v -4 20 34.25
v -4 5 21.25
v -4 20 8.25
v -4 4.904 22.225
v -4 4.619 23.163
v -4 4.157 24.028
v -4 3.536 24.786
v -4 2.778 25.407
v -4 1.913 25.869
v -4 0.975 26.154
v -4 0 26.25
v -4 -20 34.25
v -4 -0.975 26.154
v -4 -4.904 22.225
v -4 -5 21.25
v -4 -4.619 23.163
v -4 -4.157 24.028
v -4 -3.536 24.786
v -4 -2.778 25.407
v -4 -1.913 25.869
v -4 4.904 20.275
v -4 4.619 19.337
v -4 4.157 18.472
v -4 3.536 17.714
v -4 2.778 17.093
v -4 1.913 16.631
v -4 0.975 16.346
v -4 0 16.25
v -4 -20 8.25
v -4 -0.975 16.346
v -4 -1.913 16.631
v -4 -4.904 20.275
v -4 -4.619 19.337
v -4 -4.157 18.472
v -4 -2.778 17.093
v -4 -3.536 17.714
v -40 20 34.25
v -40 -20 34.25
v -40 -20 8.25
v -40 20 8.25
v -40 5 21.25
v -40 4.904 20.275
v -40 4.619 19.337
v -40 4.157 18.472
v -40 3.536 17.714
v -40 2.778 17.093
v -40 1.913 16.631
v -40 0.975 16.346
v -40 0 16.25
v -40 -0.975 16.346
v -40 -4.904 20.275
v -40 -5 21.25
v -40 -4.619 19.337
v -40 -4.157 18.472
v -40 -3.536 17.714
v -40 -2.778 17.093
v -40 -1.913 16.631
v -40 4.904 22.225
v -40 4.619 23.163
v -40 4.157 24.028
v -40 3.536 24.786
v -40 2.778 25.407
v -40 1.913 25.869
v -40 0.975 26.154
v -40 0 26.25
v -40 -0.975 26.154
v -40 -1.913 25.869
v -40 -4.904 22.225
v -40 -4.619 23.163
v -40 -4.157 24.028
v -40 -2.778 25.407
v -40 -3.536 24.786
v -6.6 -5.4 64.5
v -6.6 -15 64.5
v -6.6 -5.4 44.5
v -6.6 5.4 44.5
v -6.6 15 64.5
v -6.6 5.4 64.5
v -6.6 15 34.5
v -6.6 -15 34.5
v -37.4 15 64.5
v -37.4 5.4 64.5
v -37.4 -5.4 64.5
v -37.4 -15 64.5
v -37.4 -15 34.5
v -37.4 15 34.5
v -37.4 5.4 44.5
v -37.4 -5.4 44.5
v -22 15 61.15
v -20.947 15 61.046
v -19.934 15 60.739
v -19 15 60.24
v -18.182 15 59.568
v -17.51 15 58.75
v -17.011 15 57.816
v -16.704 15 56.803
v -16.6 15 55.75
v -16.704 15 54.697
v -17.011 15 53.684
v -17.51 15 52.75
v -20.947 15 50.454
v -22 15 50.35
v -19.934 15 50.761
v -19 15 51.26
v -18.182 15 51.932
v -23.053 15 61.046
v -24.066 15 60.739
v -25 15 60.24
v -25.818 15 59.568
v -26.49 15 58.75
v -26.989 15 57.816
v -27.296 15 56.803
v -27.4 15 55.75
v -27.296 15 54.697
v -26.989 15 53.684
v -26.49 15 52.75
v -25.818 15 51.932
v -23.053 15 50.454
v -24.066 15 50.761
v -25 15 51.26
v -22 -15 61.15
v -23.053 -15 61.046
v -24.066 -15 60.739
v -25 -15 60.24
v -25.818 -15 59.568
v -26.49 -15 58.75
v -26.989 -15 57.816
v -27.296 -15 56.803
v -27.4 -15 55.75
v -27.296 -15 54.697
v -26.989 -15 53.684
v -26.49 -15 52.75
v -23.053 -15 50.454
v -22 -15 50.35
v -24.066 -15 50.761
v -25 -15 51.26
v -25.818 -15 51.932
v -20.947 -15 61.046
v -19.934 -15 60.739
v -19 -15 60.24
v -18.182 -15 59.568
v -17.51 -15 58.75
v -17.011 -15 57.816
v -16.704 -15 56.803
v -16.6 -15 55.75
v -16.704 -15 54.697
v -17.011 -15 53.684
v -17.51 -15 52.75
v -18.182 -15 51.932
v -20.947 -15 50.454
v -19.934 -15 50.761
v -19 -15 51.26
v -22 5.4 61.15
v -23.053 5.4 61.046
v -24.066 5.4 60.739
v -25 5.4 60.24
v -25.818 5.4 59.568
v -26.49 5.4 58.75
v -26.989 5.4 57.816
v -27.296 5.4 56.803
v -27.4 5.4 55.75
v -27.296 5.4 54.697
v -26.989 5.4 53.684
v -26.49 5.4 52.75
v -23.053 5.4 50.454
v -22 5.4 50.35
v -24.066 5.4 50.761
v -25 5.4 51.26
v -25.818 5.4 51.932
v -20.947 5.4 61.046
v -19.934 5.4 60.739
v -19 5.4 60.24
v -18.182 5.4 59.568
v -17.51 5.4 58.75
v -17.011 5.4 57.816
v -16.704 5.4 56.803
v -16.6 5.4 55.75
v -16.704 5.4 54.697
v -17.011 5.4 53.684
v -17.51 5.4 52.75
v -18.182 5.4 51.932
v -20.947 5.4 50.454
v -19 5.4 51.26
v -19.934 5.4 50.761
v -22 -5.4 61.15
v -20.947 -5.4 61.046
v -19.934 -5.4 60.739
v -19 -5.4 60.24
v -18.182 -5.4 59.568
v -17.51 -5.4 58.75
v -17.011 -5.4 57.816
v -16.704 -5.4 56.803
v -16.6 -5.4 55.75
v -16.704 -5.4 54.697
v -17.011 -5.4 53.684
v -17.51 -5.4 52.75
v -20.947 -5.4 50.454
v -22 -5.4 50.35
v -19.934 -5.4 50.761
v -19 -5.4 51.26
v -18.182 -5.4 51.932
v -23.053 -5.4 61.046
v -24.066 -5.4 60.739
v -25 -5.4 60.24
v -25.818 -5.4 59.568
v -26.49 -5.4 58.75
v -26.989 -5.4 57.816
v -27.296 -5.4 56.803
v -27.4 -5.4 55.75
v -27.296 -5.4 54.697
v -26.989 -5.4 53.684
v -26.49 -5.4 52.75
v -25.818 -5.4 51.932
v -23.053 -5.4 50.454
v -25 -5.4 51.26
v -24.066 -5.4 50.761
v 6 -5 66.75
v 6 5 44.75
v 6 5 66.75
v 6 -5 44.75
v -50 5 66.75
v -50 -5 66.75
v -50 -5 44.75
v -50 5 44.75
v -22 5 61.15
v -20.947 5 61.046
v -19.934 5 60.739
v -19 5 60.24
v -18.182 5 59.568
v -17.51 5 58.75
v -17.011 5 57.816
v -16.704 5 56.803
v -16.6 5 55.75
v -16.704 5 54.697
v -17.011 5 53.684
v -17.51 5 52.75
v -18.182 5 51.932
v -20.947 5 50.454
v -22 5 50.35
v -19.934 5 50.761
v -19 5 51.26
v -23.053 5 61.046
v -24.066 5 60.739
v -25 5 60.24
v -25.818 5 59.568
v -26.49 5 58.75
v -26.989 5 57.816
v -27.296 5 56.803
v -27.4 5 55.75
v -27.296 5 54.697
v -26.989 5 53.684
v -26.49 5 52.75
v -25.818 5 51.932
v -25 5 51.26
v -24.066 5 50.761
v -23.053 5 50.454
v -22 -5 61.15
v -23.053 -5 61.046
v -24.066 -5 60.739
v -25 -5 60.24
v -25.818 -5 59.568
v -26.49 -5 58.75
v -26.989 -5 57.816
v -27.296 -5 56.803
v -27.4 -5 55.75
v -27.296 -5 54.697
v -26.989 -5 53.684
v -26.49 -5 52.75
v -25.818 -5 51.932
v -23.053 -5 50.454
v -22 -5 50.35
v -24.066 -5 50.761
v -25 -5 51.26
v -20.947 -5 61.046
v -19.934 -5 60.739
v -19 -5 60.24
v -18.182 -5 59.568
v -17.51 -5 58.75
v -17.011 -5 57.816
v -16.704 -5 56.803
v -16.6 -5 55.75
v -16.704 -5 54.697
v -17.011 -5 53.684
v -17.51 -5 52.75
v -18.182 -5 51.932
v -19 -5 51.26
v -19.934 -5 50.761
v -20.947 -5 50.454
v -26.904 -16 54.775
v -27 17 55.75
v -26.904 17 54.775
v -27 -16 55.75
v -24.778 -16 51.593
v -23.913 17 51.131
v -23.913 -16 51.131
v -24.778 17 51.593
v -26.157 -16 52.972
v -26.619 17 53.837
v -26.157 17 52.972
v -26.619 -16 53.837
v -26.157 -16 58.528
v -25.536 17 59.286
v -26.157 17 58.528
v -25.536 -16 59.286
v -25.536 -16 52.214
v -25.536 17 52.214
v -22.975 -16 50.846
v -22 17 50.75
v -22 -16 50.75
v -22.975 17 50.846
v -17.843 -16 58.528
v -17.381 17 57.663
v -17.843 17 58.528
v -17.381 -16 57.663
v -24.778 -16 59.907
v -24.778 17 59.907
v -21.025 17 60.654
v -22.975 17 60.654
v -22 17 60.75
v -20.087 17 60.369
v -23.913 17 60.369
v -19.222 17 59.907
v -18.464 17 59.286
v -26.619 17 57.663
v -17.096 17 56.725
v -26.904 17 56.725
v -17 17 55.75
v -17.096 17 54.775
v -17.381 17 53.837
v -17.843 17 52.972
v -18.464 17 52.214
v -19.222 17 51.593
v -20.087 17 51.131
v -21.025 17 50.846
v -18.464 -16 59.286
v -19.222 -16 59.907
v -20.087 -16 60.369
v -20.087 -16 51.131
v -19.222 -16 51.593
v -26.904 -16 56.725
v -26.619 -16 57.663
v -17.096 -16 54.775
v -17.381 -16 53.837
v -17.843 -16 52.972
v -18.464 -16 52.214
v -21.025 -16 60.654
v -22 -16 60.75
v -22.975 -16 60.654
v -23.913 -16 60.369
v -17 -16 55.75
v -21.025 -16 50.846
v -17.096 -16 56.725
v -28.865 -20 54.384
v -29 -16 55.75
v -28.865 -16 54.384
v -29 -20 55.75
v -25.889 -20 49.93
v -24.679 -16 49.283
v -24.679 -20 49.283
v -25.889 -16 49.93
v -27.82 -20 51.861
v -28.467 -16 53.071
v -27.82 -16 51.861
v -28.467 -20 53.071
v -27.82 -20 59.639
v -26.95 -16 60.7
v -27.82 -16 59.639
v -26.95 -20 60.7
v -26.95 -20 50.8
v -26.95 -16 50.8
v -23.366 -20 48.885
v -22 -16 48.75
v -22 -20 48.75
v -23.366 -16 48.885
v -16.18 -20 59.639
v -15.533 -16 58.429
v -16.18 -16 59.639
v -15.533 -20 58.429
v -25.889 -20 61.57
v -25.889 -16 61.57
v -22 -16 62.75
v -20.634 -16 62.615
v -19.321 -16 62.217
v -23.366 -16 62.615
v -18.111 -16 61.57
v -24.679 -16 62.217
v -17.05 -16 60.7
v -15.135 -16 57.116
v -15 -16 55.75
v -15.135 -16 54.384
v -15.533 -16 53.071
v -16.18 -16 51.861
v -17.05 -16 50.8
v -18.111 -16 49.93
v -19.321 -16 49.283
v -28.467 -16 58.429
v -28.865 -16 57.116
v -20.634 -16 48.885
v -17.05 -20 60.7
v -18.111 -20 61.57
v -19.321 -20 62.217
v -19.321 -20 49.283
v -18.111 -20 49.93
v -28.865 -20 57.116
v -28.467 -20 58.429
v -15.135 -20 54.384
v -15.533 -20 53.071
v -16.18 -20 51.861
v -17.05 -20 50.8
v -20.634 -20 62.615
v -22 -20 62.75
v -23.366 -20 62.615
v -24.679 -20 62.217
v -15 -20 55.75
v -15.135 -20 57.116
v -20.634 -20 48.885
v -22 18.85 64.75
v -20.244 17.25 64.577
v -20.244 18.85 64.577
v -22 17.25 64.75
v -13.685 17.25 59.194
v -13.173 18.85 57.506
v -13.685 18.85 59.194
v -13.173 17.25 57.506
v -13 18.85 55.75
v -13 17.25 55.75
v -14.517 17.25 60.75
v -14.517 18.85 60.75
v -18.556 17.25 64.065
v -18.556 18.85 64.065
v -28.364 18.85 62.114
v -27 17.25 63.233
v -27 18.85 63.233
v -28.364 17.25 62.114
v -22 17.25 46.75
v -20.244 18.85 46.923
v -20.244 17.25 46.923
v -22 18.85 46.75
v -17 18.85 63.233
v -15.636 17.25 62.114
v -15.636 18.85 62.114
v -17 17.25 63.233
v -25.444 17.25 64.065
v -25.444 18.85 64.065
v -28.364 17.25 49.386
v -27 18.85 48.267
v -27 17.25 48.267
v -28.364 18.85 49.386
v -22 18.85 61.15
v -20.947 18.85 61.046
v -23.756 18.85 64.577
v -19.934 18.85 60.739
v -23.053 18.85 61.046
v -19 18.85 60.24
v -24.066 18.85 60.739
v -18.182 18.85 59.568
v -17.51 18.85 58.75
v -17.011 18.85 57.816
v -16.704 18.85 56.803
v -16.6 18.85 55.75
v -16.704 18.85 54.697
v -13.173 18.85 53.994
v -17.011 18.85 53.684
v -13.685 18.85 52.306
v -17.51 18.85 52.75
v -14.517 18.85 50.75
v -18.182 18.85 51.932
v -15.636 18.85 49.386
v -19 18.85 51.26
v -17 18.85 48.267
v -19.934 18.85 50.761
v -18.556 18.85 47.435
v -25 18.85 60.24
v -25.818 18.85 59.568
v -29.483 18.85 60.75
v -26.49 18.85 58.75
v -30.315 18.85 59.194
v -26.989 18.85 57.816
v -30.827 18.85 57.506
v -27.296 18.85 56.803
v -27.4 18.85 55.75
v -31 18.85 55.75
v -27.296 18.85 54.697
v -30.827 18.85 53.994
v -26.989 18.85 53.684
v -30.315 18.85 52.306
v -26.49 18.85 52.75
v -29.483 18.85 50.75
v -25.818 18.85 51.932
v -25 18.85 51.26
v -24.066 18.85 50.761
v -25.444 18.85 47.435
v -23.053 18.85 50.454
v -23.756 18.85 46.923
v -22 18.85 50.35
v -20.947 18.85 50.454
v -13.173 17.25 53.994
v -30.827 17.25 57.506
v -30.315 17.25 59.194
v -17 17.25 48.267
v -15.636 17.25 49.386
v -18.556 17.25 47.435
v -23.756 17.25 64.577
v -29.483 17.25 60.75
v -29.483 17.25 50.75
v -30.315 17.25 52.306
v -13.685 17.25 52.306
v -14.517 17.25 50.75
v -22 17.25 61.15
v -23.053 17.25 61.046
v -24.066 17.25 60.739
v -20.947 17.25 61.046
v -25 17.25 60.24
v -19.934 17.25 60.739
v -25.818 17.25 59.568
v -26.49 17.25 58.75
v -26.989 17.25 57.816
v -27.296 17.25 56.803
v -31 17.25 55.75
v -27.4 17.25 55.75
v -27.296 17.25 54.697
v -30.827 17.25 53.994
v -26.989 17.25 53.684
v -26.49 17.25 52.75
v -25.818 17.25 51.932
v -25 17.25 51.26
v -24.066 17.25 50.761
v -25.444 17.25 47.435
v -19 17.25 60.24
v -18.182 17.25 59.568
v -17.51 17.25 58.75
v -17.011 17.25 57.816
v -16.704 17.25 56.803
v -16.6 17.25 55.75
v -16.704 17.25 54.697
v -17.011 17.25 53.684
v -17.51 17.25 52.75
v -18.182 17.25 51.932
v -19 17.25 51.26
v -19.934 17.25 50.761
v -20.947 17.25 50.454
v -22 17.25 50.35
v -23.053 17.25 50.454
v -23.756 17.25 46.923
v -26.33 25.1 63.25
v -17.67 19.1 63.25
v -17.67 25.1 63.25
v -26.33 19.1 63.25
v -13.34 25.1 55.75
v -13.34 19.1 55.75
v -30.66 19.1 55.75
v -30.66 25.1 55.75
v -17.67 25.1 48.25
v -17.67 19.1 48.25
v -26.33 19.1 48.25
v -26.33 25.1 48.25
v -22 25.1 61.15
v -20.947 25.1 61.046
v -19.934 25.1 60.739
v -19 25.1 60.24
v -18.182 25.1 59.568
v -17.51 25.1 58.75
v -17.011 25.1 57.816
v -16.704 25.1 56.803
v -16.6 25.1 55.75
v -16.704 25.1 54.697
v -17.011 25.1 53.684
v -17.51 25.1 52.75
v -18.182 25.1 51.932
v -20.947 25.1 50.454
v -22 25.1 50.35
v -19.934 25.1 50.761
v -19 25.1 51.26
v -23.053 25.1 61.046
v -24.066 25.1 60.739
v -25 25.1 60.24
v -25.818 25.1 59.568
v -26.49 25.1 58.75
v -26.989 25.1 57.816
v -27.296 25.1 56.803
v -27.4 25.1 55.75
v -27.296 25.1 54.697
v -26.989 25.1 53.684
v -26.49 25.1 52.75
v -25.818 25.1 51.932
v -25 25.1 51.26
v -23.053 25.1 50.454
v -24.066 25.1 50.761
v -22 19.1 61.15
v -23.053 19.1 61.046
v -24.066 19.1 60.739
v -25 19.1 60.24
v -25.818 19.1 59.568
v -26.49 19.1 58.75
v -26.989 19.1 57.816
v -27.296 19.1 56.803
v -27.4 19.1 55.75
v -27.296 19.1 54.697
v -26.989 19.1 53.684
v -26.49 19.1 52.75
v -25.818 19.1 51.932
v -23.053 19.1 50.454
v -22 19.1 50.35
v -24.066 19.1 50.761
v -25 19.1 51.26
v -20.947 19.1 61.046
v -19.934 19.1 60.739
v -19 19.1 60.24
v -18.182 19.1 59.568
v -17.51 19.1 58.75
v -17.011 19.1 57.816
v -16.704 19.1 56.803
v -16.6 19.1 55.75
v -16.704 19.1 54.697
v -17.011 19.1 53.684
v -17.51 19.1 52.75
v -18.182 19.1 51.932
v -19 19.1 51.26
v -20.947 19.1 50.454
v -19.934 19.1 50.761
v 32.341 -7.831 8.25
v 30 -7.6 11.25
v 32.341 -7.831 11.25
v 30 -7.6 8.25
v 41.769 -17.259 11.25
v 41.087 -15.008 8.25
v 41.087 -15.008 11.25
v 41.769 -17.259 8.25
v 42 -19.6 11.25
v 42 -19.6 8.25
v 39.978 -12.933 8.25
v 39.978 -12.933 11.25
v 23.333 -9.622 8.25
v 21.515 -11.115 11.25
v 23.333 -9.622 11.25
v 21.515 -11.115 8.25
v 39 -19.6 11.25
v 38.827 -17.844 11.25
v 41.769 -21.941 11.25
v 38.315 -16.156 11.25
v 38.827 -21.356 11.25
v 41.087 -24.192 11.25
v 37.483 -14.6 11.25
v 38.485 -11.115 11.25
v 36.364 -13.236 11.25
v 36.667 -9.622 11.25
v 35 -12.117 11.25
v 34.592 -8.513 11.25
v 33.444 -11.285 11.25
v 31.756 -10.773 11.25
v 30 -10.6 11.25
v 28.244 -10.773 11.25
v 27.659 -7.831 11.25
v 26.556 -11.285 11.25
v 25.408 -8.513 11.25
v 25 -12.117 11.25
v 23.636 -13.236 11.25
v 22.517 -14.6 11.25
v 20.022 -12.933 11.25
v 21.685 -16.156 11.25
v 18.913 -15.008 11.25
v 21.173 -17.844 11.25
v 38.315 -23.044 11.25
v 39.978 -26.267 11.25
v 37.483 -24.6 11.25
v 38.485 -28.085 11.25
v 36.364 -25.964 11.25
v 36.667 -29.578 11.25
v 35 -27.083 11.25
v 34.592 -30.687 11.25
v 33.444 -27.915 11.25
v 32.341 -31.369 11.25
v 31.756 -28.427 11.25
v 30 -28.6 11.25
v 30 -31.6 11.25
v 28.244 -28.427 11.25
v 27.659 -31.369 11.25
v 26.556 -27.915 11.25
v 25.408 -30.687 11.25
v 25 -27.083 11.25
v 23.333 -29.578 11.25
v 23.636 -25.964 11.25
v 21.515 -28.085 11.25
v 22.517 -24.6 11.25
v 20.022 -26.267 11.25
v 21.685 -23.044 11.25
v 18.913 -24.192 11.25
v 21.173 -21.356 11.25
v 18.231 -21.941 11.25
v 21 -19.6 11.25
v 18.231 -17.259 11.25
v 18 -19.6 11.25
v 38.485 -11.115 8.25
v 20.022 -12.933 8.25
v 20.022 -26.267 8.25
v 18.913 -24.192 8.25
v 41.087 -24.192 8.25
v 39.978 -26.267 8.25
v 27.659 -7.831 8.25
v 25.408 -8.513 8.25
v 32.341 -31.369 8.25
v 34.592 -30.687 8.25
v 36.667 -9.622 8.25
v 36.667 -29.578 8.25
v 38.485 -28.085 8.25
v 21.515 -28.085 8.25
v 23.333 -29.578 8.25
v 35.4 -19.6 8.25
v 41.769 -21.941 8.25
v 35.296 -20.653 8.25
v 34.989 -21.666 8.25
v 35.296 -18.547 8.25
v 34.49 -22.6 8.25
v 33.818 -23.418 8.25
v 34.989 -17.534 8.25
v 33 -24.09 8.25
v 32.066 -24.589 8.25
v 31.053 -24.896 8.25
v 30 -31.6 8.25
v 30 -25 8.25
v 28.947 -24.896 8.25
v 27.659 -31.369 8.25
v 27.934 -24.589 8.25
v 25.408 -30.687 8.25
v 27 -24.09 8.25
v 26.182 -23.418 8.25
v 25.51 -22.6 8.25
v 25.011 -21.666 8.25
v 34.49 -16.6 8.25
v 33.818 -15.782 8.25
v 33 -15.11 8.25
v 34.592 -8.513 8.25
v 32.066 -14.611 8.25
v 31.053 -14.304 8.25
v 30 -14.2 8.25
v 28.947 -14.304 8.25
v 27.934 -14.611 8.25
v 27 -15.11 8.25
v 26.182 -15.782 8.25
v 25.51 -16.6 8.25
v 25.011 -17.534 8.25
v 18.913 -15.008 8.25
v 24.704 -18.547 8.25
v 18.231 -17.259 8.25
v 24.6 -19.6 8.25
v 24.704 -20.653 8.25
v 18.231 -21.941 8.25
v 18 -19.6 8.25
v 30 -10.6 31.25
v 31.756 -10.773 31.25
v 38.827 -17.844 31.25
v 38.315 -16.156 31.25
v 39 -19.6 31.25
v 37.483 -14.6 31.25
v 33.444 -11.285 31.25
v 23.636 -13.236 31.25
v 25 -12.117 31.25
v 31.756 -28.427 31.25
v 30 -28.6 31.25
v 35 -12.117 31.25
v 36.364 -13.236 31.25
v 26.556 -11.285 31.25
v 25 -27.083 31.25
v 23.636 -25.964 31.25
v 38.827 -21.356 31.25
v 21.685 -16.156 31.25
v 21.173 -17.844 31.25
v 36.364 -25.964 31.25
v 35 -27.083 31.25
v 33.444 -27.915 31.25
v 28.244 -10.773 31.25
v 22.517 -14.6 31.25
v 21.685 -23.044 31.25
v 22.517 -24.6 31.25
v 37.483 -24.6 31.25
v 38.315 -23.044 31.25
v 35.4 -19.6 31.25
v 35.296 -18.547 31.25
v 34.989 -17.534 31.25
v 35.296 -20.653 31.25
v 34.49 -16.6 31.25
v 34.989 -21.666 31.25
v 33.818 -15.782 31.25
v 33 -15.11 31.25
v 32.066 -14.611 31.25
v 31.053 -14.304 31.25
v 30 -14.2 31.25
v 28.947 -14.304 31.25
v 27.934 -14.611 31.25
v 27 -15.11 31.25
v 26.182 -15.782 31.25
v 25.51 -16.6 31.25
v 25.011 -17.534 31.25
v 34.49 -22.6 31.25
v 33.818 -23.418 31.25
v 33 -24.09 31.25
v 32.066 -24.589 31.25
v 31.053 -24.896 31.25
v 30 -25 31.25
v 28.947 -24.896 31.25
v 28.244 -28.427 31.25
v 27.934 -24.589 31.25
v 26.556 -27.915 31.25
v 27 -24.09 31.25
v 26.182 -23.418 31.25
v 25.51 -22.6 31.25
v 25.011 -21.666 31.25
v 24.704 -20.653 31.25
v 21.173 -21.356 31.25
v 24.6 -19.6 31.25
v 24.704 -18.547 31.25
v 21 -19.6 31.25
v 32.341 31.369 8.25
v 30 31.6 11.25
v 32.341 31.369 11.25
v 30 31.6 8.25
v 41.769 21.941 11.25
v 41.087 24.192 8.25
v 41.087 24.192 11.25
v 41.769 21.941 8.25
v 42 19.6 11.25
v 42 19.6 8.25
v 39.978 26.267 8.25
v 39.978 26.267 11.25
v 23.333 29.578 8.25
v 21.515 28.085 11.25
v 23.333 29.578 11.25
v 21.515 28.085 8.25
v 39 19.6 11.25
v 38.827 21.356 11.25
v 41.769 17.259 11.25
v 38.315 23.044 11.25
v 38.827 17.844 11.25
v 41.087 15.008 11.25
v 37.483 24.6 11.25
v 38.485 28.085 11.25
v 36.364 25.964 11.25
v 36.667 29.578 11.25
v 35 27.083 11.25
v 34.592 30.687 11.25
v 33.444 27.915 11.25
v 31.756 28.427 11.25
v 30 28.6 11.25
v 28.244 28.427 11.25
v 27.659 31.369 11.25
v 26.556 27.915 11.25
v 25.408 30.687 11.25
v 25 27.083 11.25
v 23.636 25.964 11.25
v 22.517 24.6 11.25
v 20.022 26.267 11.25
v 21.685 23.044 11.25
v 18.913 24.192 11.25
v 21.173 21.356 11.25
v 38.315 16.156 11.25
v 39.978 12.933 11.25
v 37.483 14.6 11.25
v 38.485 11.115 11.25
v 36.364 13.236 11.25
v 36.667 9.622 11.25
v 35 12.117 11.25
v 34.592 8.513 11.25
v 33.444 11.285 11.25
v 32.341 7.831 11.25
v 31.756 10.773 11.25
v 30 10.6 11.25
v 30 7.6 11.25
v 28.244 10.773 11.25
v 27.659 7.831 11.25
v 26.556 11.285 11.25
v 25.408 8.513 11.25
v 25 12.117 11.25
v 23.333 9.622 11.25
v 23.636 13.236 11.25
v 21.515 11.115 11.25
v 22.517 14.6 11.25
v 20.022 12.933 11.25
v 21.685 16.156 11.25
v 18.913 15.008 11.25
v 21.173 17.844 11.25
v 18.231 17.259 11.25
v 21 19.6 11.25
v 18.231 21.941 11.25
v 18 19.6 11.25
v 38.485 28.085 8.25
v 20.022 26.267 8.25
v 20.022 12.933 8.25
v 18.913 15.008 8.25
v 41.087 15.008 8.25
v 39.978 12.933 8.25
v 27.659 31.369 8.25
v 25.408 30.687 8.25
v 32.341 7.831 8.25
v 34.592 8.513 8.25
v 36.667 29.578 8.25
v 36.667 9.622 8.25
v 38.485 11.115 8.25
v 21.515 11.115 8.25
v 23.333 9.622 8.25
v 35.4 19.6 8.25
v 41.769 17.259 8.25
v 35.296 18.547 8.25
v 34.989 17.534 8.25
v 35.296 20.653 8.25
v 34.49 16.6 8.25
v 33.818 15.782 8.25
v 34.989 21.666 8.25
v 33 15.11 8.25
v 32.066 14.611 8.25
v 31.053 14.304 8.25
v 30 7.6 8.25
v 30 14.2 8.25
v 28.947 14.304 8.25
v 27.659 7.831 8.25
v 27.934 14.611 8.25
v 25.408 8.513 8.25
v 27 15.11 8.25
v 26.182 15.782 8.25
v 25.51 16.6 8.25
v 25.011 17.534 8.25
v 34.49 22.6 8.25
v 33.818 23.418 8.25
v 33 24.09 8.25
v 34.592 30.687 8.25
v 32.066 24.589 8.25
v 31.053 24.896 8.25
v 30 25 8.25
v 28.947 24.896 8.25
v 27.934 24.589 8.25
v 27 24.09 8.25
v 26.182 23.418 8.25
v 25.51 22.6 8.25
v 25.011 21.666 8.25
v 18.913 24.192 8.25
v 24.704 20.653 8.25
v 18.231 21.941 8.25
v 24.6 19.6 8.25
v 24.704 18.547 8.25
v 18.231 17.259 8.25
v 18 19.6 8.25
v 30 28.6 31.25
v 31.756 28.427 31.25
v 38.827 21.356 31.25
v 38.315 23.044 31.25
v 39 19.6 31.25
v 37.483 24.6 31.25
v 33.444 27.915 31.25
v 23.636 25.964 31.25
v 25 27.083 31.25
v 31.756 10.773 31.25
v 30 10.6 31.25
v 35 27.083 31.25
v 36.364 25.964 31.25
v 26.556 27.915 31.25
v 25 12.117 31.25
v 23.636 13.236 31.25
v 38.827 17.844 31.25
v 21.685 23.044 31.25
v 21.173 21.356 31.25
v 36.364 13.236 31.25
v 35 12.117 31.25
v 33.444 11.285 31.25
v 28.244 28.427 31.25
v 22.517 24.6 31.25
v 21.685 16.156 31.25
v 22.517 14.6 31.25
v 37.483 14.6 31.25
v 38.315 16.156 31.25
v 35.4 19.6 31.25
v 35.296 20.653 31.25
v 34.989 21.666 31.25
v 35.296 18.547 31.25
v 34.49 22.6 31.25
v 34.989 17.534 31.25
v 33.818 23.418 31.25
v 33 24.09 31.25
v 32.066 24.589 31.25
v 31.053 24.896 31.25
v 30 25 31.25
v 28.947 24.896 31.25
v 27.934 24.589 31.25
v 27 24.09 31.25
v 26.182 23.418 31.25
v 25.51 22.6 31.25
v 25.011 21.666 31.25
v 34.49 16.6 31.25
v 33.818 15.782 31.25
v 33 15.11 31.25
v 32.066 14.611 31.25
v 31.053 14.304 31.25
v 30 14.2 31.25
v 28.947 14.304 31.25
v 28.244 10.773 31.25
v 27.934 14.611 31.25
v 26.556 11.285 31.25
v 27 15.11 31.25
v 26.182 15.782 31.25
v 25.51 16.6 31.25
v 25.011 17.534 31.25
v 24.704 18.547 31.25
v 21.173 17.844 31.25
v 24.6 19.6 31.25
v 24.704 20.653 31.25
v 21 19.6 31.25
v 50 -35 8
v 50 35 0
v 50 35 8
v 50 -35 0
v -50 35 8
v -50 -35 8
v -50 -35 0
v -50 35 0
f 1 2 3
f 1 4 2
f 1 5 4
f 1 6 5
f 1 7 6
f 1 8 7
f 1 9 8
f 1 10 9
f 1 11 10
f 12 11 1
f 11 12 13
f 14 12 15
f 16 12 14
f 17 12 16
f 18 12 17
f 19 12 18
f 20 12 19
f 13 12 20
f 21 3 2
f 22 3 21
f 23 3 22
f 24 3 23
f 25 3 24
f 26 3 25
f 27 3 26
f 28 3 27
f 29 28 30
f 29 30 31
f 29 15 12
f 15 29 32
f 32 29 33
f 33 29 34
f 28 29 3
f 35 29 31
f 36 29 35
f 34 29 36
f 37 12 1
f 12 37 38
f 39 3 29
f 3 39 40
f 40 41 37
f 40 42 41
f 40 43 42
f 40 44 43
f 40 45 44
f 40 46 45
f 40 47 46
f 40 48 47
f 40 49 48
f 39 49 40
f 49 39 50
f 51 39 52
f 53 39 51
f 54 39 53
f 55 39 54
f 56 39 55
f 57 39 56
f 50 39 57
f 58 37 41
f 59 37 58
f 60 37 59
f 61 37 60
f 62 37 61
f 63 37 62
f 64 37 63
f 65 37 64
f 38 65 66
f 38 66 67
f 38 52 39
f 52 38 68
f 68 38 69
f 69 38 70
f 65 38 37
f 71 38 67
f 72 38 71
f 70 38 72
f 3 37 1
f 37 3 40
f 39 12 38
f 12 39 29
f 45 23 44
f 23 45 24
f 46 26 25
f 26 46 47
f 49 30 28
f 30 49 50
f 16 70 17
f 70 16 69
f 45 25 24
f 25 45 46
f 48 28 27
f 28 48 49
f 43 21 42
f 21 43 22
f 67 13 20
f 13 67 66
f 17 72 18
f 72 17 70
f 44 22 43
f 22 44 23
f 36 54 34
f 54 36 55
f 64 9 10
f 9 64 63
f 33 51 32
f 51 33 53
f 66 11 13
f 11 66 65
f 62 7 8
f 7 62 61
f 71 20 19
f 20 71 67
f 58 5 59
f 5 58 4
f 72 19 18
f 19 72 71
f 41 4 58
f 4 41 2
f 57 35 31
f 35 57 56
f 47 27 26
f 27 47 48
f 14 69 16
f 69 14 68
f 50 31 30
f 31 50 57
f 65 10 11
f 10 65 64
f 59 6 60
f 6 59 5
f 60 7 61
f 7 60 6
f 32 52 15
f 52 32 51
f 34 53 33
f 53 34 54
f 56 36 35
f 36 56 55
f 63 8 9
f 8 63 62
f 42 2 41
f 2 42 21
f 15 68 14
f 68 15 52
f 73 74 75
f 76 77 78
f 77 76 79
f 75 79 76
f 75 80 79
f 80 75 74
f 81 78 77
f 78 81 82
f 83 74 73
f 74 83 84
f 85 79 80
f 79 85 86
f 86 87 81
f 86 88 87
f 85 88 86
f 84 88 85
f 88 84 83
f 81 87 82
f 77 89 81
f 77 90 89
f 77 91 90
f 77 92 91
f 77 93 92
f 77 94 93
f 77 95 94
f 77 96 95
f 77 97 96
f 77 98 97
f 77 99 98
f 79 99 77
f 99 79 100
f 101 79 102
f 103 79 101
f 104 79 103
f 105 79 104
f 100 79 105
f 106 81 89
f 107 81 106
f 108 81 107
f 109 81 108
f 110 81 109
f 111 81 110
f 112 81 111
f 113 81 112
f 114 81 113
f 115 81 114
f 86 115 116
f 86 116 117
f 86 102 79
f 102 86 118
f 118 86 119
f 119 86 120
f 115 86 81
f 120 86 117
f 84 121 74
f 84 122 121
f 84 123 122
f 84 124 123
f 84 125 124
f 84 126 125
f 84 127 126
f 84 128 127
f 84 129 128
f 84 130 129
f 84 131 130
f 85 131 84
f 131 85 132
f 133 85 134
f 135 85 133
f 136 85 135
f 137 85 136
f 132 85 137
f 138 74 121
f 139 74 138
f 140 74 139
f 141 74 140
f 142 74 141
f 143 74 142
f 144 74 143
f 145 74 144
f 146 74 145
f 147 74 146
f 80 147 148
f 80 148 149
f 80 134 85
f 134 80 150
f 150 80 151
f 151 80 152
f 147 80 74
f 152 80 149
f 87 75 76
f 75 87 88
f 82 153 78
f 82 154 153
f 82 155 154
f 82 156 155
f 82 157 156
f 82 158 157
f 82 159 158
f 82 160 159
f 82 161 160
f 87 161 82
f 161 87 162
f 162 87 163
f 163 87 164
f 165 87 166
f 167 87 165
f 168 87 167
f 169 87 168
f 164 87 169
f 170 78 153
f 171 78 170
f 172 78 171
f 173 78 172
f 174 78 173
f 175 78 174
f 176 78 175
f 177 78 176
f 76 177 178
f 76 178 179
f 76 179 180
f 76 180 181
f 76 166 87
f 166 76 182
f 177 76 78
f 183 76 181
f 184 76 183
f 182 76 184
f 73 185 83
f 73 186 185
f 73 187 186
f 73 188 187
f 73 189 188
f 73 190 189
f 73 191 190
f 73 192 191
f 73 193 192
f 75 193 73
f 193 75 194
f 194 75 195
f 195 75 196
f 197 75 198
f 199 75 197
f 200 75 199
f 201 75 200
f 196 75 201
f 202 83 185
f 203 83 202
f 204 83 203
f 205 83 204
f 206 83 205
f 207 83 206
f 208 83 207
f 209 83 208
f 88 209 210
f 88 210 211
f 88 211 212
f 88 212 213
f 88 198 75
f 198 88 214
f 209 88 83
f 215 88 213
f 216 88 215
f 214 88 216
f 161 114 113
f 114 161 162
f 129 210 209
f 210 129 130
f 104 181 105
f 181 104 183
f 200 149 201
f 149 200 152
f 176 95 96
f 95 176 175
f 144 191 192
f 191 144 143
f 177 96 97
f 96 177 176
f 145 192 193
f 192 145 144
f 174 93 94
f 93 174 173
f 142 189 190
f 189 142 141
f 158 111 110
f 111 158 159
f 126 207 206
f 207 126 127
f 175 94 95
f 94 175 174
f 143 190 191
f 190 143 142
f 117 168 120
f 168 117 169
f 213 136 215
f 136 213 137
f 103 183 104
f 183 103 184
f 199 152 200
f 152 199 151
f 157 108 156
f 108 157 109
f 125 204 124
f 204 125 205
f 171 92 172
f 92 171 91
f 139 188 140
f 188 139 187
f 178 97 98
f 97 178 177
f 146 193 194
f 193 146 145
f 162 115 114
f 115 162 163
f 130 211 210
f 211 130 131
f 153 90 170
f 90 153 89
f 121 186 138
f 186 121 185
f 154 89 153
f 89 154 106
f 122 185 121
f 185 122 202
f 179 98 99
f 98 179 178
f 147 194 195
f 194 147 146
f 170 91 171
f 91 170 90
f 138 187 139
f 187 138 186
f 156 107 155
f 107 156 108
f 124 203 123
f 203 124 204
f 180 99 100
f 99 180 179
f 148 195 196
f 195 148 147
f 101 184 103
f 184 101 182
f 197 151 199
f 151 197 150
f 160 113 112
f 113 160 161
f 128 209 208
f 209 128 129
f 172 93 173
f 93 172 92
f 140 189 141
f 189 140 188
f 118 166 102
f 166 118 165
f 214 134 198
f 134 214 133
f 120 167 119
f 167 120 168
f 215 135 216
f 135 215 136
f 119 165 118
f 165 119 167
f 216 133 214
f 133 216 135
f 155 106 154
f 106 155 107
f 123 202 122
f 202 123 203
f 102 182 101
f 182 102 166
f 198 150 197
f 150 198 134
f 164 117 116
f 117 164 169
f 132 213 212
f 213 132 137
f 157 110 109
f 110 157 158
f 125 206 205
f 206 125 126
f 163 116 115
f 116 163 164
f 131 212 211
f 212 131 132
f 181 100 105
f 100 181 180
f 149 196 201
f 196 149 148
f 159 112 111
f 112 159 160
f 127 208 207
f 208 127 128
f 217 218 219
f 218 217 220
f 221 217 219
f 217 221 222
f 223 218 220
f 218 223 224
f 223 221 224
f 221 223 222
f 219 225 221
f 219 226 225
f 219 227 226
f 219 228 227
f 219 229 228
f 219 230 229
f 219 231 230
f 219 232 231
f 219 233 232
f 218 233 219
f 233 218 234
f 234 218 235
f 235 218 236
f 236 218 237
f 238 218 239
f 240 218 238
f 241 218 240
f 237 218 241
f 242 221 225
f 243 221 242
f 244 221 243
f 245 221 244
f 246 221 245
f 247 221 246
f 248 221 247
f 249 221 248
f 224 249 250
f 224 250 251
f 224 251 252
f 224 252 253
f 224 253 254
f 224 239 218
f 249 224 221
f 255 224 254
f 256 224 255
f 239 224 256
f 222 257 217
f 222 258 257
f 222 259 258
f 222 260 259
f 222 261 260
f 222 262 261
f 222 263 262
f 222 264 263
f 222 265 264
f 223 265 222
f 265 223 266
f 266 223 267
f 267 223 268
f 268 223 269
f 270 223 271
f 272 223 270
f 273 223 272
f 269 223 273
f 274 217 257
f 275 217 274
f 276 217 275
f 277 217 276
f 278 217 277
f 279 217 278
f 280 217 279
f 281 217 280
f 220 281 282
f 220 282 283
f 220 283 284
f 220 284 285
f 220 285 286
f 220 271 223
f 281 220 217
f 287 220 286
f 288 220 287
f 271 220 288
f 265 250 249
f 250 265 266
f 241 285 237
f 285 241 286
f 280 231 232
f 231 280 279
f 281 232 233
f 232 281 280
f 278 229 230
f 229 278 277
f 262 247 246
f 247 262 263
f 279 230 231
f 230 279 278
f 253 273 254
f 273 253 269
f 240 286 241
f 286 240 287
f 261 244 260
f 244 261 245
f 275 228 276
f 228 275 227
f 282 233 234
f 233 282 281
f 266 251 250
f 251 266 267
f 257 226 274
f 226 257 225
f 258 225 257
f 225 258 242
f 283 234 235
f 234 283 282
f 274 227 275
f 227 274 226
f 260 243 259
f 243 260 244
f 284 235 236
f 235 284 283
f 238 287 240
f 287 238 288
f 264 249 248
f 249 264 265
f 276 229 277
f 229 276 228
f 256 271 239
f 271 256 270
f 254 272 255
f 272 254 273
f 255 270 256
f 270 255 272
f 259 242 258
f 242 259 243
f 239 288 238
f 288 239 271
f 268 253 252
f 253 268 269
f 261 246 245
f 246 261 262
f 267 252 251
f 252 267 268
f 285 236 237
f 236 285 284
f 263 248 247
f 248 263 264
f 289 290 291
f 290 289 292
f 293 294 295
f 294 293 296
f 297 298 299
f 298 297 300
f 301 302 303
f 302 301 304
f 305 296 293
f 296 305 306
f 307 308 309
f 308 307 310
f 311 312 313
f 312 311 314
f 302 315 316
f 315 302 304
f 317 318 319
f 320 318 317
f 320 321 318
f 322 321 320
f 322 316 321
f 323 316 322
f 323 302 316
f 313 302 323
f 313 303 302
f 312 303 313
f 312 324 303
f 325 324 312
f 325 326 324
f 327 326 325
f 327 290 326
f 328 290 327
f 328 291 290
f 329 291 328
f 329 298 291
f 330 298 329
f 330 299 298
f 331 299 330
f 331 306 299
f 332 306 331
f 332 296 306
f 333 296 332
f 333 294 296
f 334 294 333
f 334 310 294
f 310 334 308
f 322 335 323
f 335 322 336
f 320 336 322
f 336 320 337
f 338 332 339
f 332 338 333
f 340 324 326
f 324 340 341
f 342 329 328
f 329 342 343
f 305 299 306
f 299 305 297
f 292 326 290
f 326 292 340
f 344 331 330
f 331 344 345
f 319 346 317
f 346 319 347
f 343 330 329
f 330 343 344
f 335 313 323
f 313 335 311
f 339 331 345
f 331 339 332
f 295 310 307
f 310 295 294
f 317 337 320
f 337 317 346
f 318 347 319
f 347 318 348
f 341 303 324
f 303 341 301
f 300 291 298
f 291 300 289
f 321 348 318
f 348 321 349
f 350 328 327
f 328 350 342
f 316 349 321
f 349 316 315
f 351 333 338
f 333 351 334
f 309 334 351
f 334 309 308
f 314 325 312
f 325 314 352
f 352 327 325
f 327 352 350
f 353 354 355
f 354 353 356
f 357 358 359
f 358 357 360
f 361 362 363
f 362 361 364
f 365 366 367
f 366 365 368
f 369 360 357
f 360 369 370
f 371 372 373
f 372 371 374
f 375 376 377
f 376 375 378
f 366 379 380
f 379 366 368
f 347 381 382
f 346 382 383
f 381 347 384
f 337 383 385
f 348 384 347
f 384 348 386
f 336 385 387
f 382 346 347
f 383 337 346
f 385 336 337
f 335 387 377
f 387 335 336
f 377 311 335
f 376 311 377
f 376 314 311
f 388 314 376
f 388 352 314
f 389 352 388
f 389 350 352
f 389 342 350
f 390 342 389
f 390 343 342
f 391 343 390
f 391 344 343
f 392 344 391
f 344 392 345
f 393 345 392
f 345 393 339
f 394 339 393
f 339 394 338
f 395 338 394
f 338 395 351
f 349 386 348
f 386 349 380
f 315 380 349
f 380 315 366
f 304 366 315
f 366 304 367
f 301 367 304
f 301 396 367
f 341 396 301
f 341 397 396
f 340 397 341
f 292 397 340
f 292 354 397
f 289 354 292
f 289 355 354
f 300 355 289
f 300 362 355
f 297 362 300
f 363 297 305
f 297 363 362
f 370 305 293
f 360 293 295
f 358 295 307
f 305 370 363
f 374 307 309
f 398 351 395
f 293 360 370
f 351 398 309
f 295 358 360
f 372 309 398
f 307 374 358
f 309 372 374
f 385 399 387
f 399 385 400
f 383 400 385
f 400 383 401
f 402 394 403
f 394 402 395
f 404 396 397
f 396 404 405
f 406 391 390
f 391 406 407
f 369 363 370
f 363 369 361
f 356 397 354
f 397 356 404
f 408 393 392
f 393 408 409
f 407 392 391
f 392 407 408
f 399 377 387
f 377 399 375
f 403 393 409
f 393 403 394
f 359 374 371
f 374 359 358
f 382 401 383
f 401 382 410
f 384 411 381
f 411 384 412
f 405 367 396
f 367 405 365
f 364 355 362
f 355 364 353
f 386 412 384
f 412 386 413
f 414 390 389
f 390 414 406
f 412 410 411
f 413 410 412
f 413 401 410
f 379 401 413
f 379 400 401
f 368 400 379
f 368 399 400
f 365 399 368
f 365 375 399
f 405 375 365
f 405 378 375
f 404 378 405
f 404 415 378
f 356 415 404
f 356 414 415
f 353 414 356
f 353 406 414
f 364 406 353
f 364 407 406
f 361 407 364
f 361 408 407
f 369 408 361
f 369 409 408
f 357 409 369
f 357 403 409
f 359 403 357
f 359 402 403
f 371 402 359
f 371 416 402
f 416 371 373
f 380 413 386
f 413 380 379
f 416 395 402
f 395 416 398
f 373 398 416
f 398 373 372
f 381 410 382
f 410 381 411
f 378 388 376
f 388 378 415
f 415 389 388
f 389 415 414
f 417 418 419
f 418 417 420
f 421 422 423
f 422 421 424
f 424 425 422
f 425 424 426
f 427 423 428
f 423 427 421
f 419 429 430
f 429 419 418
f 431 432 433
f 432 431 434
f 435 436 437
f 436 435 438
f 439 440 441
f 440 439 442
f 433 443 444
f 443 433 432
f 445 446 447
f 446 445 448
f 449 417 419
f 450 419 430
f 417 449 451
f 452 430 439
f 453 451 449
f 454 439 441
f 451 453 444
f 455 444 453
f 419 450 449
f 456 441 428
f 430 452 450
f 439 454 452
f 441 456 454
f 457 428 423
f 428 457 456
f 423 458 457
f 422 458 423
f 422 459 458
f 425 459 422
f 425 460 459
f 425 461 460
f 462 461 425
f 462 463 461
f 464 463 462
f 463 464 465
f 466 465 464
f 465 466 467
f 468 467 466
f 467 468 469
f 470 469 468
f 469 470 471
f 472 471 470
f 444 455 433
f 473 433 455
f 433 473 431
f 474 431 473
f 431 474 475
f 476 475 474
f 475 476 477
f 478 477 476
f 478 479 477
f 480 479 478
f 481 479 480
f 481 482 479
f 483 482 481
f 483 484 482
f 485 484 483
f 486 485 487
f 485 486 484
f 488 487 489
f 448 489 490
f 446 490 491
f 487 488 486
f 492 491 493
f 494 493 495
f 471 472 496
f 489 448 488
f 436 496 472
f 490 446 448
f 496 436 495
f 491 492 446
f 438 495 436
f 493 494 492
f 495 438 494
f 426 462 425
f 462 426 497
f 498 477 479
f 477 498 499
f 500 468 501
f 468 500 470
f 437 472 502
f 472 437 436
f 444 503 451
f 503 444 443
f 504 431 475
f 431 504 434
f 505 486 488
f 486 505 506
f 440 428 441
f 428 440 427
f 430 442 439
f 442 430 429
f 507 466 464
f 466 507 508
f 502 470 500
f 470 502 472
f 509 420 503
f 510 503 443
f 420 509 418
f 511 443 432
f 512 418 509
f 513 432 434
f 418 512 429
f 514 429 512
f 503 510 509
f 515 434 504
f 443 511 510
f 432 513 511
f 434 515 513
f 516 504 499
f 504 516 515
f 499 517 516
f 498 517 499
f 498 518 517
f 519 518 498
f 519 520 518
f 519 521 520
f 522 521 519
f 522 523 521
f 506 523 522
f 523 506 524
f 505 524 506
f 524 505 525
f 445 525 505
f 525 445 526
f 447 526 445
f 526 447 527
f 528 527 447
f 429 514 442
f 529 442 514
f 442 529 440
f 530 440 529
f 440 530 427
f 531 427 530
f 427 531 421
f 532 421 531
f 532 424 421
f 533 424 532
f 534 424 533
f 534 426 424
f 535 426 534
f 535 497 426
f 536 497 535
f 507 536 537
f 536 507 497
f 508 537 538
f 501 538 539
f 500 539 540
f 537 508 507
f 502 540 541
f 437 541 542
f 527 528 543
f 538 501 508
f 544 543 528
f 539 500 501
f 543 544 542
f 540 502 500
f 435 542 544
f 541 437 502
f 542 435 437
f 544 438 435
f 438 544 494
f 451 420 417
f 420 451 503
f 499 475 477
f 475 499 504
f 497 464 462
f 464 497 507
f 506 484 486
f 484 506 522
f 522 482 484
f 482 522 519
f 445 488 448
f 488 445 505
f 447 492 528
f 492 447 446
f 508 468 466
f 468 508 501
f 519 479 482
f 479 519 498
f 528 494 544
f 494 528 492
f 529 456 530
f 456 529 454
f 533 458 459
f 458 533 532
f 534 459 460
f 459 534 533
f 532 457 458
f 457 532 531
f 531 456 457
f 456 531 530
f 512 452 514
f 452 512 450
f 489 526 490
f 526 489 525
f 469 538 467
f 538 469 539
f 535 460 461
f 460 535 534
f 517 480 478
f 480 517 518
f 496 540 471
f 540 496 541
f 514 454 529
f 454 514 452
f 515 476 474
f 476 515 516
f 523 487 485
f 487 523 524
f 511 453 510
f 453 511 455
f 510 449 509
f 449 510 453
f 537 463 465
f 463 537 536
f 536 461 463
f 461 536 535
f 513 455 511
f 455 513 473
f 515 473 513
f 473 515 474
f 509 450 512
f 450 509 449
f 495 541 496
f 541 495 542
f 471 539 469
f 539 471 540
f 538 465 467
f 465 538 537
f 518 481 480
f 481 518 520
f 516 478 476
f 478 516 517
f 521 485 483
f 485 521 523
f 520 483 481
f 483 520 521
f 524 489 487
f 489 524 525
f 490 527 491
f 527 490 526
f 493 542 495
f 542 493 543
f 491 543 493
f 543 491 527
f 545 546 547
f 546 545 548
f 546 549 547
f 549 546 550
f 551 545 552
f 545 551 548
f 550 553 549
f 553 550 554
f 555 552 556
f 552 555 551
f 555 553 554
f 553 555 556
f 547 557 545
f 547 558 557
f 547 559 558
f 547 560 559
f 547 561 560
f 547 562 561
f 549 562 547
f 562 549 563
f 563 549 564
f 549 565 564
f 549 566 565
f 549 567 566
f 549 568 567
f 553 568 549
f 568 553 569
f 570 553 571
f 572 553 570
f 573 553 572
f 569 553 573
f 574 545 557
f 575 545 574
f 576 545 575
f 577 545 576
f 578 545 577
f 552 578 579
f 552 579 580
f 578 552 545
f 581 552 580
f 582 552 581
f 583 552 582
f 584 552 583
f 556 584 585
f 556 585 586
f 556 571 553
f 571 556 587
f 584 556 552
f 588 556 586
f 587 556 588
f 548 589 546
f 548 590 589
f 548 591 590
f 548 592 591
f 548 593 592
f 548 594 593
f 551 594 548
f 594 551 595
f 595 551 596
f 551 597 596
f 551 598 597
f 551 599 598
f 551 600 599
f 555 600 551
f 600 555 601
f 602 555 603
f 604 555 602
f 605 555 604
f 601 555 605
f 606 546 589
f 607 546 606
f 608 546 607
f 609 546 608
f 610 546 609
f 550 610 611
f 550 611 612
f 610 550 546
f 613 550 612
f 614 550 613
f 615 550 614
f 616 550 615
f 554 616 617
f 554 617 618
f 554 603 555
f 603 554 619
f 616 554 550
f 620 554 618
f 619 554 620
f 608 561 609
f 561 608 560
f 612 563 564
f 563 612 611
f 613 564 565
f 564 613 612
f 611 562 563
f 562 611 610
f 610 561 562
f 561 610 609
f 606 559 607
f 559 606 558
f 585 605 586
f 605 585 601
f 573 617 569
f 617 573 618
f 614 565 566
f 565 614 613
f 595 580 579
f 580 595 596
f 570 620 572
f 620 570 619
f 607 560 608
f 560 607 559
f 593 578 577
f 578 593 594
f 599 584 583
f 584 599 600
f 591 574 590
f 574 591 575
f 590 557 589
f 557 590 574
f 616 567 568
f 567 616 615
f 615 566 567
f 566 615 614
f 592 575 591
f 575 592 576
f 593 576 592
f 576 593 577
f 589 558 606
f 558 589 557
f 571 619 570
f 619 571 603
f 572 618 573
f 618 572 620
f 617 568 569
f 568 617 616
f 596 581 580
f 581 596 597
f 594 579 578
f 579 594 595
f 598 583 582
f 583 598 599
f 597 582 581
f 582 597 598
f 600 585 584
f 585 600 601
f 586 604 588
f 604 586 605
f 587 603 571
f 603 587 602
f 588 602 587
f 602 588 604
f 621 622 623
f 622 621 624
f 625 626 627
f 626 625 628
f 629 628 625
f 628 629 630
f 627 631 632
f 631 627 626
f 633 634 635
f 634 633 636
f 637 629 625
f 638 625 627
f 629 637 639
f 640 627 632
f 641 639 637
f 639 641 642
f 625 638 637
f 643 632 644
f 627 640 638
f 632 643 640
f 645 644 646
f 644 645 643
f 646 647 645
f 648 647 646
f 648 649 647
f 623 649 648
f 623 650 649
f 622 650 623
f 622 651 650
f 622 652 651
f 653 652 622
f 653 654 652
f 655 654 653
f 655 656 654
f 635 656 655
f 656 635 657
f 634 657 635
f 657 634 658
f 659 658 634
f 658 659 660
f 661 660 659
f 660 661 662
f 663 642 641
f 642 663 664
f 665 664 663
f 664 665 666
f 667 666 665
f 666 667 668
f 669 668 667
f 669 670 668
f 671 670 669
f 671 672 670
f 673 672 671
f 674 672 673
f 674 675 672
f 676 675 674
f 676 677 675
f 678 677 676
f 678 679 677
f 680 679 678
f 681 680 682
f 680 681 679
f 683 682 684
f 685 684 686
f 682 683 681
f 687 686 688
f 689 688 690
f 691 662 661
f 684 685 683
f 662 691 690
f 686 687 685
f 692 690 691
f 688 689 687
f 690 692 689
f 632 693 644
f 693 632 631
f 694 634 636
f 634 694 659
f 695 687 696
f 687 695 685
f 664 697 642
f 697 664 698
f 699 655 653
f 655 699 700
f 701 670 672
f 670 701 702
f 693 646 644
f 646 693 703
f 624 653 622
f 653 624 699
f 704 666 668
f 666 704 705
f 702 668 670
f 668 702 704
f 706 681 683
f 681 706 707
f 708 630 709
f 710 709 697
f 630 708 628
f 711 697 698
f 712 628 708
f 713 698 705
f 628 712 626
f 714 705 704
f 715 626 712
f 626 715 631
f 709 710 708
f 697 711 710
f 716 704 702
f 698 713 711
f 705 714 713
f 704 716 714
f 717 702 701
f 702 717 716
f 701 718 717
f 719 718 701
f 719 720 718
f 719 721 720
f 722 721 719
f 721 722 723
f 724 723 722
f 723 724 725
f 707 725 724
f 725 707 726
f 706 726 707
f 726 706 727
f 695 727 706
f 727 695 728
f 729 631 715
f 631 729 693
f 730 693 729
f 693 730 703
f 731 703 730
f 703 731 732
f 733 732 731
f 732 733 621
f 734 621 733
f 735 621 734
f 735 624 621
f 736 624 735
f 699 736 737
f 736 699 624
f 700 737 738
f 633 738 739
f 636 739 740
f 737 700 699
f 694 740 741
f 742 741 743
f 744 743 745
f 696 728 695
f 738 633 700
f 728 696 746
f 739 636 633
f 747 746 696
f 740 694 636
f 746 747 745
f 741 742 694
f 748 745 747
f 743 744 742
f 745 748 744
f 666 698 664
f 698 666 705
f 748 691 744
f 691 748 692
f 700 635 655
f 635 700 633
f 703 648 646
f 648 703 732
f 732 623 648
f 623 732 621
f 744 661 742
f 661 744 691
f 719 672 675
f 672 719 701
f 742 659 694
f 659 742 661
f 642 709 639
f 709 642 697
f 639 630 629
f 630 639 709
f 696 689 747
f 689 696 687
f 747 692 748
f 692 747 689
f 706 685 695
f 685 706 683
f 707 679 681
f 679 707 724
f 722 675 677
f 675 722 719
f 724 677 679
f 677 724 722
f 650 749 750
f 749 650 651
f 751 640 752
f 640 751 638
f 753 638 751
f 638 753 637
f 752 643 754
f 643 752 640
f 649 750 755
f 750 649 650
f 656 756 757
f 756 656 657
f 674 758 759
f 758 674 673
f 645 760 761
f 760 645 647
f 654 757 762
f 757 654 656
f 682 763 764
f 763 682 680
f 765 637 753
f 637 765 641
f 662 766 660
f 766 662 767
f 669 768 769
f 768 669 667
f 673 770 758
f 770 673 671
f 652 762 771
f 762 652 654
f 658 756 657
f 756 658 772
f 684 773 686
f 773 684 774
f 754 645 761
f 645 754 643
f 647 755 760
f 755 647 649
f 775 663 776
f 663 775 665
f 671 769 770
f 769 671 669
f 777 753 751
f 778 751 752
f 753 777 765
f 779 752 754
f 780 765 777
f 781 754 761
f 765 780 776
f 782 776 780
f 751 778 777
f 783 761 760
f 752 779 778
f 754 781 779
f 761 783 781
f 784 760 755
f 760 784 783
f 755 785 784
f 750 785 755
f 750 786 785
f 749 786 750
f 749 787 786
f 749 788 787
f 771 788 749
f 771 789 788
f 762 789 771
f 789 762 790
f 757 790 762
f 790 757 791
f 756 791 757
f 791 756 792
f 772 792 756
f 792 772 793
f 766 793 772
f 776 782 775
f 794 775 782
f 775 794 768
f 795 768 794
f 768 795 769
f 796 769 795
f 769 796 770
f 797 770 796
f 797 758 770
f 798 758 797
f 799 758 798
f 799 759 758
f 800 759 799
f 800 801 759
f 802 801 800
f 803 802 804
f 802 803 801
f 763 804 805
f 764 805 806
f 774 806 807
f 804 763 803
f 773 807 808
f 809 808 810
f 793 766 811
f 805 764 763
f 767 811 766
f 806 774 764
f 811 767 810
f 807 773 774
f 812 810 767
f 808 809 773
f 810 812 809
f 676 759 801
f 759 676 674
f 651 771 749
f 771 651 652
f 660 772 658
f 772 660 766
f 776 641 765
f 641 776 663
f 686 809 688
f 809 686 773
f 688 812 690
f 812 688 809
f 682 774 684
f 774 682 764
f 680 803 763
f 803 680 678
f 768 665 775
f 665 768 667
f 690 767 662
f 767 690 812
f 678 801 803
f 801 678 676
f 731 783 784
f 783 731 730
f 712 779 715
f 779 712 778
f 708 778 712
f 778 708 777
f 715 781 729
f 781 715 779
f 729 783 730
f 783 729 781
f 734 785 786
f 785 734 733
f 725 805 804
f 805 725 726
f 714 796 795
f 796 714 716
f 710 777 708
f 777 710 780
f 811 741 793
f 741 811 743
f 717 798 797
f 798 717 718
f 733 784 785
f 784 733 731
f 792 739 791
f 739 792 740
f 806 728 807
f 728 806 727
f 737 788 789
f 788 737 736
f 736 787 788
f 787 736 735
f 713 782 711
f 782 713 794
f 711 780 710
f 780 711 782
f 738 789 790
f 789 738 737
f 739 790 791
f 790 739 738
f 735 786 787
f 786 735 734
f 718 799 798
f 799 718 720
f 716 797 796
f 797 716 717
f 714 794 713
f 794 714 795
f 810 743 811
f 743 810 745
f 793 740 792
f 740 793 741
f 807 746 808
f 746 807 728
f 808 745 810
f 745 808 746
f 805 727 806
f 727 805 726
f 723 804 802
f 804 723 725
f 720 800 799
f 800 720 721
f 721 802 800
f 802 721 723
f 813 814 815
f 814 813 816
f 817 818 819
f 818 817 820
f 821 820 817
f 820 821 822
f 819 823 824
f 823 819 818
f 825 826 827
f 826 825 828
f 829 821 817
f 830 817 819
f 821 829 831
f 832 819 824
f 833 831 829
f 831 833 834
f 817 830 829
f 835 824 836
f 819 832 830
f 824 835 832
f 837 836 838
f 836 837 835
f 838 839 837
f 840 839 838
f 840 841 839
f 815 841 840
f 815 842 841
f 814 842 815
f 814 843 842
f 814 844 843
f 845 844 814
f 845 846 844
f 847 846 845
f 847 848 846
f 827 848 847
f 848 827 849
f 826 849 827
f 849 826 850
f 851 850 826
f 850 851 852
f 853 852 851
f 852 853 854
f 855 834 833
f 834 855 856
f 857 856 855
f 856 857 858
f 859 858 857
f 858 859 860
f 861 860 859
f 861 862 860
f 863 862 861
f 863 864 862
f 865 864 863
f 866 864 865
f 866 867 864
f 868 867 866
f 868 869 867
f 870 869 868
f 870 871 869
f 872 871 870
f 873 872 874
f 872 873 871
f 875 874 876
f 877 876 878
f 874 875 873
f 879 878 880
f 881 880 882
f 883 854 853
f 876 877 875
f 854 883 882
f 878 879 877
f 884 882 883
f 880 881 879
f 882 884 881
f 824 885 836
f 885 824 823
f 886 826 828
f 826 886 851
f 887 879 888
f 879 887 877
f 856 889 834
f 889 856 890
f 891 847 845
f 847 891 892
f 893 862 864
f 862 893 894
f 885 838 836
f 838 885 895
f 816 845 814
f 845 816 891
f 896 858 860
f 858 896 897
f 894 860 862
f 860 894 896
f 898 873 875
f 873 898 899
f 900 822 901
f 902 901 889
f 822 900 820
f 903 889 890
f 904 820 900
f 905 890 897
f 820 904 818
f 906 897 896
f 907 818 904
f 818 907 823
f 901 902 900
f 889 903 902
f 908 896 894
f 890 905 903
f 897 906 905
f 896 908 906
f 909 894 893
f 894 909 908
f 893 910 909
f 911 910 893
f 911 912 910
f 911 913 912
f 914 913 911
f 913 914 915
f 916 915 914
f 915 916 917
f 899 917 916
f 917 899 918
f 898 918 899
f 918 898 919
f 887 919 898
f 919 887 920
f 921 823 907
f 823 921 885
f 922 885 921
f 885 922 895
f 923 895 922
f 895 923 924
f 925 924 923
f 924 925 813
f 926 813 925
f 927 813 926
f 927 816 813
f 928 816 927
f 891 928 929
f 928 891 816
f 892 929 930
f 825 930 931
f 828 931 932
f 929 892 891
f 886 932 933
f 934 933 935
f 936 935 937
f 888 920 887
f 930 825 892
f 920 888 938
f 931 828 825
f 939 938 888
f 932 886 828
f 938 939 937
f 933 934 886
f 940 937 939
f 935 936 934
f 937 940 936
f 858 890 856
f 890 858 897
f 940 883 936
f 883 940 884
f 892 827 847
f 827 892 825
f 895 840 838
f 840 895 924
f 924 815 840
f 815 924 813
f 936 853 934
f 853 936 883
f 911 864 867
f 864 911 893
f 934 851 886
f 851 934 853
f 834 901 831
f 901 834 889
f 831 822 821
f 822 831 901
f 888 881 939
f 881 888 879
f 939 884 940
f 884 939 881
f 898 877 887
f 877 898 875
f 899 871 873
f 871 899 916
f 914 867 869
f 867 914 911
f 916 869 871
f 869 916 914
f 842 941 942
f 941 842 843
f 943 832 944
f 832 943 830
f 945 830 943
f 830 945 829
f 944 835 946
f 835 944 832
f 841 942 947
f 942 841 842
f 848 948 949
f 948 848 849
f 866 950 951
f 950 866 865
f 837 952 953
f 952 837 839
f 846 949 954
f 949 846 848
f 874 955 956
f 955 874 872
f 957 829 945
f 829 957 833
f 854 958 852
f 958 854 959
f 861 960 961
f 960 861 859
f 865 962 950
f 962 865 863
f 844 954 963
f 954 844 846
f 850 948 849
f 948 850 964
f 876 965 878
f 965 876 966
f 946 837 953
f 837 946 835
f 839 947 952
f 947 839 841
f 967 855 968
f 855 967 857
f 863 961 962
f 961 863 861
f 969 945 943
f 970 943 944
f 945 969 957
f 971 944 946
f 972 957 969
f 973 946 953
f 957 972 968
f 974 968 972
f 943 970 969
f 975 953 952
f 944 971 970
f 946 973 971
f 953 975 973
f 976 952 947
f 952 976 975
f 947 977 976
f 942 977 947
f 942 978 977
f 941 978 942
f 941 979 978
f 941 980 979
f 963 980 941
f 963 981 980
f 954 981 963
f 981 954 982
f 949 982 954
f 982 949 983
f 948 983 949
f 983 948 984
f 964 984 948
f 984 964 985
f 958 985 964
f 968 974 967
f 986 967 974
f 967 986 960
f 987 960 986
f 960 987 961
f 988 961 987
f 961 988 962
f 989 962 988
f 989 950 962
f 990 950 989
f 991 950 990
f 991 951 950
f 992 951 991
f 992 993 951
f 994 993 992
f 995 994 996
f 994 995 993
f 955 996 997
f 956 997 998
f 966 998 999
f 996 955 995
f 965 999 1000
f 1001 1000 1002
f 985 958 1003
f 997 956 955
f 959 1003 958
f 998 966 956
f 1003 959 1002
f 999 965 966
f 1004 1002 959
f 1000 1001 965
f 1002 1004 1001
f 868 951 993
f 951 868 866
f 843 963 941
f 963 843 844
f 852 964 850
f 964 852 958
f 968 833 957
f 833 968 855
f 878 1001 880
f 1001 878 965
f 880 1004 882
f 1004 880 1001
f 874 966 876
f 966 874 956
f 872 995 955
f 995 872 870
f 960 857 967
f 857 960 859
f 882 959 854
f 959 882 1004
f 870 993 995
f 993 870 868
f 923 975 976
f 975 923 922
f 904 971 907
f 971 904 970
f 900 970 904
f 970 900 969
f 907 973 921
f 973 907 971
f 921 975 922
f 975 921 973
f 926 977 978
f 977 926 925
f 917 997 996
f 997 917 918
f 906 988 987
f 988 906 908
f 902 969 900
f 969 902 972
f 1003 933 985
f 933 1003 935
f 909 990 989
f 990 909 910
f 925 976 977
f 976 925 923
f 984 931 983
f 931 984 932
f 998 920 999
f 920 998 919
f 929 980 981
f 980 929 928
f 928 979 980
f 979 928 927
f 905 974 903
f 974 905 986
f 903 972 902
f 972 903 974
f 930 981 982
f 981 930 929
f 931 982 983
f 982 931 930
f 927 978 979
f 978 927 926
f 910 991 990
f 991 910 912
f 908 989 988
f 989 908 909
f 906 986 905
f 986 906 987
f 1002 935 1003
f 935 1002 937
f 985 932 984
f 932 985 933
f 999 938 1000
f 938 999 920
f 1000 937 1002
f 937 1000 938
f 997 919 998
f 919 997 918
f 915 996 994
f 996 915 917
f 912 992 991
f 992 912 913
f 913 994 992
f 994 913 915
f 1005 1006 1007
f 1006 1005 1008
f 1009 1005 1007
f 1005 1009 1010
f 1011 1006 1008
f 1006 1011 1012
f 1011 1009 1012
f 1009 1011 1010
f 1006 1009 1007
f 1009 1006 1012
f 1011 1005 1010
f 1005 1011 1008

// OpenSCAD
$fn = 32;

// ------------------------------------------------------------------------
// Indexing jig: plate 100 x 70 mm, pin d10
// Every part is its own module, assembly() places every instance.
// ------------------------------------------------------------------------

// --- part 1 ---
module jig_plate() {
  difference() {
    translate([-50, -35, 0]) cube([100, 70, 8]);
  }
}

// --- part 2 ---
module locator_block() {
  difference() {
    translate([-18, -20, 0]) cube([36, 40, 26]);
    translate([0, 0, 13]) rotate([0, 90, 0]) cylinder(h = 38, d = 10, center = true);
  }
}

// --- part 3 ---
module index_fork() {
  difference() {
    translate([-15.4, -15, 0]) cube([30.8, 30, 30]);
    translate([-16.4, -5.4, 10]) cube([32.8, 10.8, 21]);
    translate([0, 0, 21.25]) rotate([90, 0, 0]) cylinder(h = 32, d = 10.8, center = true);
  }
}

// --- part 4 ---
module index_arm() {
  difference() {
    translate([-28, -5, 0]) cube([56, 10, 22]);
    translate([0, 0, 11]) rotate([90, 0, 0]) cylinder(h = 12, d = 10.8, center = true);
  }
}

// --- part 5 ---
module index_pin() {
  rotate([0, 90, 0]) cylinder(h = 34, d = 10, center = true);
  translate([-20, 0, 0]) rotate([0, 90, 0]) cylinder(h = 4, d = 14);
}

// --- part 6 ---
module pin_washer() {
  difference() {
      translate([0, 0, 0]) cylinder(h = 1.6, d = 18);
      translate([0, 0, -1]) cylinder(h = 3.6, d = 10.8);
    }
}

// --- part 7 ---
module lock_nut() {
  difference() {
    linear_extrude(height = 6) polygon(points = [[8.66, 0], [4.33, 7.5], [-4.33, 7.5], [-8.66, 0], [-4.33, -7.5], [4.33, -7.5]]);
    translate([0, 0, -1]) cylinder(h = 8, d = 10.8);
  }
}

// --- part 8 ---
module guide_bush_a() {
  difference() {
    union() {
      cylinder(h = 3, d = 24);
      translate([0, 0, 3]) cylinder(h = 20, d = 18);
    }
    translate([0, 0, -1]) cylinder(h = 25, d = 10.8);
  }
}

// --- part 9 ---
module guide_bush_b() {
  difference() {
    union() {
      cylinder(h = 3, d = 24);
      translate([0, 0, 3]) cylinder(h = 20, d = 18);
    }
    translate([0, 0, -1]) cylinder(h = 25, d = 10.8);
  }
}

// --- assembly ---
module assembly() {
  color([0.80, 0.24, 0.20]) translate([0, 0, 0]) rotate([0, 0, 0]) jig_plate();
  color([0.20, 0.45, 0.75]) translate([-22, 0, 8.25]) rotate([0, 0, 0]) locator_block();
  color([0.25, 0.62, 0.32]) translate([-22, 0, 34.5]) rotate([0, 0, 0]) index_fork();
  color([0.92, 0.70, 0.18]) translate([-22, 0, 44.75]) rotate([0, 0, 0]) index_arm();
  color([0.58, 0.35, 0.70]) translate([-22, 0, 55.75]) rotate([0, 0, 90]) index_pin();
  color([0.16, 0.66, 0.66]) translate([-22, 18.85, 55.75]) rotate([90, 0, 0]) pin_washer();
  color([0.85, 0.48, 0.18]) translate([-22, 25.1, 55.75]) rotate([90, 0, 0]) lock_nut();
  color([0.55, 0.60, 0.65]) translate([30, -19.6, 8.25]) rotate([0, 0, 0]) guide_bush_a();
  color([0.75, 0.30, 0.55]) translate([30, 19.6, 8.25]) rotate([0, 0, 0]) guide_bush_b();
}

assembly();
